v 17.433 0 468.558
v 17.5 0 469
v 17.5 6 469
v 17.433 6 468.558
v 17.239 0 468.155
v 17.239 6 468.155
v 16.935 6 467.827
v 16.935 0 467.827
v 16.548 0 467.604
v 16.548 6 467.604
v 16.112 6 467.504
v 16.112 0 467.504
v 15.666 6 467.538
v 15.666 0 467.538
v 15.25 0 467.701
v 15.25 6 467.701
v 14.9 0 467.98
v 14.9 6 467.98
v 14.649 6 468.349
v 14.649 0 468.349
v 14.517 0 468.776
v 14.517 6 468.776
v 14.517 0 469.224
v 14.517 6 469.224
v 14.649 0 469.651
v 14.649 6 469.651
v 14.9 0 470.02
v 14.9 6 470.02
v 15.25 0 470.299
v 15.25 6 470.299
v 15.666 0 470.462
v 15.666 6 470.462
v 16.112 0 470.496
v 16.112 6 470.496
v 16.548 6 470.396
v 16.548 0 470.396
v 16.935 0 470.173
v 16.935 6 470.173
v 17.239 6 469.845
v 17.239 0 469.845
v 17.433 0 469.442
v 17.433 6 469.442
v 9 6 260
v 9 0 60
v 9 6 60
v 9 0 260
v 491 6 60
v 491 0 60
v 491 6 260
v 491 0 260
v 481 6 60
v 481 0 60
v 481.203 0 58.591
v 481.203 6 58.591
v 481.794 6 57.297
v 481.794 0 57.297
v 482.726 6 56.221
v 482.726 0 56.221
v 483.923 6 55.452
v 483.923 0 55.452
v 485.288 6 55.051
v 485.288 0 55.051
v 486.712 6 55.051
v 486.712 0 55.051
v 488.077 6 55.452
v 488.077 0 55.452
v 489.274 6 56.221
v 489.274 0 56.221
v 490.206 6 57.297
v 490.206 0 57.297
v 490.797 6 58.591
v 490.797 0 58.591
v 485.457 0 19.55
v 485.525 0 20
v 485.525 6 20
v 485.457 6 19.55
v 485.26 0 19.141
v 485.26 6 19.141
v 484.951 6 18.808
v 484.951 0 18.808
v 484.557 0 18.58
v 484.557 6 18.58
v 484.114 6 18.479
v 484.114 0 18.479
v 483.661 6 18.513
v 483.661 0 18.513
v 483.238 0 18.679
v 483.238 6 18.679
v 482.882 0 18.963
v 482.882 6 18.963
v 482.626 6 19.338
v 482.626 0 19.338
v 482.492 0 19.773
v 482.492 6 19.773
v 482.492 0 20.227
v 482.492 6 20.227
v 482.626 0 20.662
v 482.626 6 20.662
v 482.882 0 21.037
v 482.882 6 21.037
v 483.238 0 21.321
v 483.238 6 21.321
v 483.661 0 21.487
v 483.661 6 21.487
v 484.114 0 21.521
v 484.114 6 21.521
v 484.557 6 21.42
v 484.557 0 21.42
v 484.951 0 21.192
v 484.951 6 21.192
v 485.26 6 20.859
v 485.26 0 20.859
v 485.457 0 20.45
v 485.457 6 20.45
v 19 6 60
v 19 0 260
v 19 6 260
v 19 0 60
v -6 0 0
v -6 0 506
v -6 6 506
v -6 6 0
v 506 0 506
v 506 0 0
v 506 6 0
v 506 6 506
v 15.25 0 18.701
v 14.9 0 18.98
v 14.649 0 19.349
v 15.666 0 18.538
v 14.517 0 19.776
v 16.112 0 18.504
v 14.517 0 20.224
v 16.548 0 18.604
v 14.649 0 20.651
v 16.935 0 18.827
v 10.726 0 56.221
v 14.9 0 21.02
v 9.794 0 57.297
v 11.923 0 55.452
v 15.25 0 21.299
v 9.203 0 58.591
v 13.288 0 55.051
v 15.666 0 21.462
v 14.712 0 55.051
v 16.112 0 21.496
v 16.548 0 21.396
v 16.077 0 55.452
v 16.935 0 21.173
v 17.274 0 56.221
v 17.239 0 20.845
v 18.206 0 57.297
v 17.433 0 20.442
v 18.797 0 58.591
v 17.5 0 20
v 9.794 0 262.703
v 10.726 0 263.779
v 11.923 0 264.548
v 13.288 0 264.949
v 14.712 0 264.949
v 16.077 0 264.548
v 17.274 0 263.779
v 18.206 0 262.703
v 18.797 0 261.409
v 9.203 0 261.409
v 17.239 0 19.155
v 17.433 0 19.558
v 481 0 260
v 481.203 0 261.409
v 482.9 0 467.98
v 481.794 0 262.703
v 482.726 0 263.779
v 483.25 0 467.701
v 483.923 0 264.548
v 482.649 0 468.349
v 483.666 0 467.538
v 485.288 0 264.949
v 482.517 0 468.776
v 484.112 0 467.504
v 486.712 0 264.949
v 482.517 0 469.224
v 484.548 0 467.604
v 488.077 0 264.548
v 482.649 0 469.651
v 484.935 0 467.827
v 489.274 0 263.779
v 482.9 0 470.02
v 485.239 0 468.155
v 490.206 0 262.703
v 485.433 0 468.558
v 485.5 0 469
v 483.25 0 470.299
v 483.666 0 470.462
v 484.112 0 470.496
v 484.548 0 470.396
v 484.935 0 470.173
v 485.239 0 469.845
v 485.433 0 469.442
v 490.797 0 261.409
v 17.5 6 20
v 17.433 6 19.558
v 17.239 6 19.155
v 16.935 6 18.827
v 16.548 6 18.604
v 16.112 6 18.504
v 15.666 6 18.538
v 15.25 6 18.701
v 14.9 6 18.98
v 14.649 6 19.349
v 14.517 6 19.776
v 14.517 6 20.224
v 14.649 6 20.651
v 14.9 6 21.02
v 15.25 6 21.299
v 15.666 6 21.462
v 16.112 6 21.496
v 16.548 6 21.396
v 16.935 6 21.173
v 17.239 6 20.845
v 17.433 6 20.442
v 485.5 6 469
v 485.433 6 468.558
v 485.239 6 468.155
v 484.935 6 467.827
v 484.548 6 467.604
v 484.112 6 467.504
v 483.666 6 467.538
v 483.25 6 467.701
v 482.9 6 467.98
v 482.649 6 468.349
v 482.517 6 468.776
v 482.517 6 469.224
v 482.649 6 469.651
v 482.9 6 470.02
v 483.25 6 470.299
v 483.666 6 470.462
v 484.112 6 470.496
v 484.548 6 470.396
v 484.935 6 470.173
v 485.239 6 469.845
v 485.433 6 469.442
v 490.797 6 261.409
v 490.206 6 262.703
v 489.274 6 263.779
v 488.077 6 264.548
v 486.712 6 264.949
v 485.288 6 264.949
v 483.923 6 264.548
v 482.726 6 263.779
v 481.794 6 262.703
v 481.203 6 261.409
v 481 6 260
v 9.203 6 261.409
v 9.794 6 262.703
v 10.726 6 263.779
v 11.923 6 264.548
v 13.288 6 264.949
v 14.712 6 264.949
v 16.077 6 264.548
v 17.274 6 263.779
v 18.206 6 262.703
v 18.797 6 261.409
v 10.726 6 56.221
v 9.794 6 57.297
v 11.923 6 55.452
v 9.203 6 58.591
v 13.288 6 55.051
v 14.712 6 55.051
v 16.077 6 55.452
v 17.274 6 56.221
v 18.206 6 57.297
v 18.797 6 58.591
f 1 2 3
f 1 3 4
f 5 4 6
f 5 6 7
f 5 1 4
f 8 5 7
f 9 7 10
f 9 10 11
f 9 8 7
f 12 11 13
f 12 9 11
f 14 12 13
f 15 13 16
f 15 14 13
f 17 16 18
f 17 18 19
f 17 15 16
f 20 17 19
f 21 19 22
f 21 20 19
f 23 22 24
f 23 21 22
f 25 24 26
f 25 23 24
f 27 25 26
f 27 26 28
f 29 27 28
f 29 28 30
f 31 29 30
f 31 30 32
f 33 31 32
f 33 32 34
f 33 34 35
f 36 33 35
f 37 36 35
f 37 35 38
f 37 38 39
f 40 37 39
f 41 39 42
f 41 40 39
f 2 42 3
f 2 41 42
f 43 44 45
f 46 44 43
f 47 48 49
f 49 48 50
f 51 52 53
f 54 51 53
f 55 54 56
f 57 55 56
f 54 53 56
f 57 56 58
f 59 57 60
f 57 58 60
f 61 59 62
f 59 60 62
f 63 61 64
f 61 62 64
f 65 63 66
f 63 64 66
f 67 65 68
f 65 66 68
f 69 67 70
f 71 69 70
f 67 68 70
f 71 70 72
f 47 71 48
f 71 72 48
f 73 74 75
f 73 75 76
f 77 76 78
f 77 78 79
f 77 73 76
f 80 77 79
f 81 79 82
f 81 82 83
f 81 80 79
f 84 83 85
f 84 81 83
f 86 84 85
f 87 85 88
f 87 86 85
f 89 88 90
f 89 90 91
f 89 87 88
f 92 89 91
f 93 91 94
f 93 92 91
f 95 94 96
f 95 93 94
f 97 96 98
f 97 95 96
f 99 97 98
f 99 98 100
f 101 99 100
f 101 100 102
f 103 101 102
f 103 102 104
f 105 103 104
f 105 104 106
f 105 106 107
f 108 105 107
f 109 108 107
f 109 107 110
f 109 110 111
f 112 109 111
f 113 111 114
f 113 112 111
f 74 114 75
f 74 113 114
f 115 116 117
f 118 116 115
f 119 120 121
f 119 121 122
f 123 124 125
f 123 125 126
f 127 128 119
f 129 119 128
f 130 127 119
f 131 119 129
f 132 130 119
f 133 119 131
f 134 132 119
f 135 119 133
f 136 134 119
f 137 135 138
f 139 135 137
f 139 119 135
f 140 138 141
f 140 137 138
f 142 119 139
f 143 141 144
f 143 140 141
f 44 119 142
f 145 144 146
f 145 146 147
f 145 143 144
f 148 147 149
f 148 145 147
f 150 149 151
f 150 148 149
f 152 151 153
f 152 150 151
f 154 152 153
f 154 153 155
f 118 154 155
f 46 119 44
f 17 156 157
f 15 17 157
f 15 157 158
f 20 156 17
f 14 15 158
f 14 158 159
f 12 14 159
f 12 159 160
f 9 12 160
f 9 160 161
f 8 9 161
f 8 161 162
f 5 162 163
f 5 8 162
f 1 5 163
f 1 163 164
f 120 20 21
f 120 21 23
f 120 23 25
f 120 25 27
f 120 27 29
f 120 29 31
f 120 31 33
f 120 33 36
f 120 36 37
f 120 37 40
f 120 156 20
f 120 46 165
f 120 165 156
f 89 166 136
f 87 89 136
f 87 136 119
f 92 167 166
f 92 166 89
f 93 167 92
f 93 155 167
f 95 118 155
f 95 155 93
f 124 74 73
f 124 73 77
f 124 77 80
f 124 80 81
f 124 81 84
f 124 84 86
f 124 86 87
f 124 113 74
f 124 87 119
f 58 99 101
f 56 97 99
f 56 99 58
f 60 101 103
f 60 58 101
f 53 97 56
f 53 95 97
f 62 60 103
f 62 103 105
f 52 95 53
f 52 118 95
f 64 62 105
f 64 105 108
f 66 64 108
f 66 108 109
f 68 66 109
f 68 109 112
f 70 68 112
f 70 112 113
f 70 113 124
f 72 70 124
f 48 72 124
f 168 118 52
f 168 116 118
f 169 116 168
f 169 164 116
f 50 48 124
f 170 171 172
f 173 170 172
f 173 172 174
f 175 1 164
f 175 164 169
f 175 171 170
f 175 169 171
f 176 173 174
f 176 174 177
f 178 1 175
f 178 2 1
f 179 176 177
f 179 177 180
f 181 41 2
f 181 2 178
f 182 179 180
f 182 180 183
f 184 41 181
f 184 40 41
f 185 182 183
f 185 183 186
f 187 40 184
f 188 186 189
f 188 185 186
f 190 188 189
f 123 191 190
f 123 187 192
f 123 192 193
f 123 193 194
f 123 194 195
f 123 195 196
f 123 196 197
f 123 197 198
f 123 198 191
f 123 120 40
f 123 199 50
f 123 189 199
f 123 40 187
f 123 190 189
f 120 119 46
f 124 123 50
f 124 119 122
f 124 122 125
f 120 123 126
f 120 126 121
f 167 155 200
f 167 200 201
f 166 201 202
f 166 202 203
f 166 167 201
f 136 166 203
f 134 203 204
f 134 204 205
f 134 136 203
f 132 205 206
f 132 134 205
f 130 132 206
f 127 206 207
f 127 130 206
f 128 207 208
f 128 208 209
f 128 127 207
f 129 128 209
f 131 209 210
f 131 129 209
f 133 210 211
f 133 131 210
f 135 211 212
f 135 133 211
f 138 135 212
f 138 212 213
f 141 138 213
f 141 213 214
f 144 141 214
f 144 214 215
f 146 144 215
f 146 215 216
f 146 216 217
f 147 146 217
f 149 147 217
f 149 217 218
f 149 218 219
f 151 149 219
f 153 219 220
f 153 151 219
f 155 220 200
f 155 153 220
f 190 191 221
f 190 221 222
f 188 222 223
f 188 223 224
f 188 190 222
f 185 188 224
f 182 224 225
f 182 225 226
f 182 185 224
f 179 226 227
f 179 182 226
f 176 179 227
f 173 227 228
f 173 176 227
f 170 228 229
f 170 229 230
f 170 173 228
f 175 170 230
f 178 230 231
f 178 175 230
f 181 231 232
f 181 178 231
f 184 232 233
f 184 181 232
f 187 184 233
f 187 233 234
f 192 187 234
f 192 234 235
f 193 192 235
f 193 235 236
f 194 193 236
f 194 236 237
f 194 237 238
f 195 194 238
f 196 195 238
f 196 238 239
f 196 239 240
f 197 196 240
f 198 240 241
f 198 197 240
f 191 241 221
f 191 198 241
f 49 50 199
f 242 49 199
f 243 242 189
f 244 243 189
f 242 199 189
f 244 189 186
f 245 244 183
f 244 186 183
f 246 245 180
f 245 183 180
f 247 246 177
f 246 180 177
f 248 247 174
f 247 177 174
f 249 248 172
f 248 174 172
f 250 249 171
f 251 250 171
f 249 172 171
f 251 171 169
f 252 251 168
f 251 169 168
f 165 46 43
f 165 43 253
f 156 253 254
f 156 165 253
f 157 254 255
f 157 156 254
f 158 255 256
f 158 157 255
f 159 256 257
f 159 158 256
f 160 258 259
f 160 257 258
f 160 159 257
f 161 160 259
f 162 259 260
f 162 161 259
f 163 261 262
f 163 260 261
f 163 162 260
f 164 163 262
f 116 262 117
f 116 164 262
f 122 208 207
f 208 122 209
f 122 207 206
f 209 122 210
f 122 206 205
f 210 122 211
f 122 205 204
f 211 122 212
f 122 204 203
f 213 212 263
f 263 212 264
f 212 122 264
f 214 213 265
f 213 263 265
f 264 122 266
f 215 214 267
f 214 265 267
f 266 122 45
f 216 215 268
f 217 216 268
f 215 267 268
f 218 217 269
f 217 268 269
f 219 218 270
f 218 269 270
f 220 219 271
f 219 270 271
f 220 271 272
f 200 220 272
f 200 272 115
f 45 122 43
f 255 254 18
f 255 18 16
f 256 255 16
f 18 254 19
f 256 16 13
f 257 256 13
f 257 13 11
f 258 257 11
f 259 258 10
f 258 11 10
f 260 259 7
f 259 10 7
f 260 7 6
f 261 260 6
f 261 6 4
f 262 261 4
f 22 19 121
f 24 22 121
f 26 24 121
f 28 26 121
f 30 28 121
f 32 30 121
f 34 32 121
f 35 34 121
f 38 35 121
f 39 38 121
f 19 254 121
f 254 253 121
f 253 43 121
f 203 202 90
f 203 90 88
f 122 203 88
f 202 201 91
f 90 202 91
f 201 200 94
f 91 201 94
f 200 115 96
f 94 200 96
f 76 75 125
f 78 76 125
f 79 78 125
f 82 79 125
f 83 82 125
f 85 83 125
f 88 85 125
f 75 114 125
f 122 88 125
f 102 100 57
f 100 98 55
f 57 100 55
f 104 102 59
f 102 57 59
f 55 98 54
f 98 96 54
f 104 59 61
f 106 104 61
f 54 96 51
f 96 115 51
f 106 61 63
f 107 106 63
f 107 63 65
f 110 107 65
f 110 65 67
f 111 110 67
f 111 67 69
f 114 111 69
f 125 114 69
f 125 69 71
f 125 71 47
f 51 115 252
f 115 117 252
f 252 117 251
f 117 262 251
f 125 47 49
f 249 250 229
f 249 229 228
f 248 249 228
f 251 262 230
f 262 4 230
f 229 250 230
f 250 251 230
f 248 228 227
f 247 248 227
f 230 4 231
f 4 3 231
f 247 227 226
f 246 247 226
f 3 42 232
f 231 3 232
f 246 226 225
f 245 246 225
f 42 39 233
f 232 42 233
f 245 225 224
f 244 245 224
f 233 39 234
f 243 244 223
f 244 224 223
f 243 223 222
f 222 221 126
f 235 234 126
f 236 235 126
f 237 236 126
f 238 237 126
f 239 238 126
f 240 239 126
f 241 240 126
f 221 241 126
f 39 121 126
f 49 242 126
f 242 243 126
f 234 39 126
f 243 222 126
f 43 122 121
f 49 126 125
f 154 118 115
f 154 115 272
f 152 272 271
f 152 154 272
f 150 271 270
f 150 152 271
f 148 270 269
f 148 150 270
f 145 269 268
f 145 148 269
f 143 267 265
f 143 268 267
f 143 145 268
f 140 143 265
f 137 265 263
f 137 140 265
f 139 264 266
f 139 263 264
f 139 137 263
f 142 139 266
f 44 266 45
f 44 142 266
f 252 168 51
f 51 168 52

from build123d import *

# Parameters (mm, degrees)
SKETCH1_W           = 500
SKETCH1_H           = 500
SKETCH1_R           = 1.525
SKETCH1_R_2         = 1.5
BOSS_EXTRUDE1_DEPTH = 6
BOSS_EXTRUDE2_DEPTH = 6
CUT_EXTRUDE1_DEPTH  = 7


with BuildPart() as part:
    # Sketch1 → Boss-Extrude1 (new body)
    with BuildSketch(Plane(origin=(0, 0, 0), x_dir=(1, 0, 0), z_dir=(0, 1, 0))):
        with Locations((250, -250)):
            Rectangle(SKETCH1_W, SKETCH1_H)
        with Locations((484, -20)):
            Circle(SKETCH1_R, mode=Mode.SUBTRACT)
        with Locations((16, -20)):
            Circle(SKETCH1_R_2, mode=Mode.SUBTRACT)
        with Locations((484, -469)):
            Circle(SKETCH1_R_2, mode=Mode.SUBTRACT)
        with Locations((16, -469)):
            Circle(SKETCH1_R_2, mode=Mode.SUBTRACT)
    extrude(amount=BOSS_EXTRUDE1_DEPTH)

    # Sketch2 → Boss-Extrude2 (add)
    with BuildSketch(Plane.XZ):
        Polygon((-6, 506), (-6, 0), (0, 0), (0, 500), (500, 500), (500, 0), (506, 0), (506, 506), align=None)
    extrude(amount=-BOSS_EXTRUDE2_DEPTH)

    # Sketch3 → Cut-Extrude1 (cut, through all)
    with BuildSketch(Plane.XZ):
        with BuildLine():
            Line((9, 60), (9, 260))
            ThreePointArc((9, 260), (14, 265), (19, 260))
            Line((19, 260), (19, 60))
            ThreePointArc((19, 60), (14, 55), (9, 60))
        make_face()
        with BuildLine():
            Line((491, 60), (491, 260))
            ThreePointArc((491, 260), (486, 265), (481, 260))
            Line((481, 260), (481, 60))
            ThreePointArc((481, 60), (486, 55), (491, 60))
        make_face()
    extrude(amount=-CUT_EXTRUDE1_DEPTH, mode=Mode.SUBTRACT)


solid = part.part
